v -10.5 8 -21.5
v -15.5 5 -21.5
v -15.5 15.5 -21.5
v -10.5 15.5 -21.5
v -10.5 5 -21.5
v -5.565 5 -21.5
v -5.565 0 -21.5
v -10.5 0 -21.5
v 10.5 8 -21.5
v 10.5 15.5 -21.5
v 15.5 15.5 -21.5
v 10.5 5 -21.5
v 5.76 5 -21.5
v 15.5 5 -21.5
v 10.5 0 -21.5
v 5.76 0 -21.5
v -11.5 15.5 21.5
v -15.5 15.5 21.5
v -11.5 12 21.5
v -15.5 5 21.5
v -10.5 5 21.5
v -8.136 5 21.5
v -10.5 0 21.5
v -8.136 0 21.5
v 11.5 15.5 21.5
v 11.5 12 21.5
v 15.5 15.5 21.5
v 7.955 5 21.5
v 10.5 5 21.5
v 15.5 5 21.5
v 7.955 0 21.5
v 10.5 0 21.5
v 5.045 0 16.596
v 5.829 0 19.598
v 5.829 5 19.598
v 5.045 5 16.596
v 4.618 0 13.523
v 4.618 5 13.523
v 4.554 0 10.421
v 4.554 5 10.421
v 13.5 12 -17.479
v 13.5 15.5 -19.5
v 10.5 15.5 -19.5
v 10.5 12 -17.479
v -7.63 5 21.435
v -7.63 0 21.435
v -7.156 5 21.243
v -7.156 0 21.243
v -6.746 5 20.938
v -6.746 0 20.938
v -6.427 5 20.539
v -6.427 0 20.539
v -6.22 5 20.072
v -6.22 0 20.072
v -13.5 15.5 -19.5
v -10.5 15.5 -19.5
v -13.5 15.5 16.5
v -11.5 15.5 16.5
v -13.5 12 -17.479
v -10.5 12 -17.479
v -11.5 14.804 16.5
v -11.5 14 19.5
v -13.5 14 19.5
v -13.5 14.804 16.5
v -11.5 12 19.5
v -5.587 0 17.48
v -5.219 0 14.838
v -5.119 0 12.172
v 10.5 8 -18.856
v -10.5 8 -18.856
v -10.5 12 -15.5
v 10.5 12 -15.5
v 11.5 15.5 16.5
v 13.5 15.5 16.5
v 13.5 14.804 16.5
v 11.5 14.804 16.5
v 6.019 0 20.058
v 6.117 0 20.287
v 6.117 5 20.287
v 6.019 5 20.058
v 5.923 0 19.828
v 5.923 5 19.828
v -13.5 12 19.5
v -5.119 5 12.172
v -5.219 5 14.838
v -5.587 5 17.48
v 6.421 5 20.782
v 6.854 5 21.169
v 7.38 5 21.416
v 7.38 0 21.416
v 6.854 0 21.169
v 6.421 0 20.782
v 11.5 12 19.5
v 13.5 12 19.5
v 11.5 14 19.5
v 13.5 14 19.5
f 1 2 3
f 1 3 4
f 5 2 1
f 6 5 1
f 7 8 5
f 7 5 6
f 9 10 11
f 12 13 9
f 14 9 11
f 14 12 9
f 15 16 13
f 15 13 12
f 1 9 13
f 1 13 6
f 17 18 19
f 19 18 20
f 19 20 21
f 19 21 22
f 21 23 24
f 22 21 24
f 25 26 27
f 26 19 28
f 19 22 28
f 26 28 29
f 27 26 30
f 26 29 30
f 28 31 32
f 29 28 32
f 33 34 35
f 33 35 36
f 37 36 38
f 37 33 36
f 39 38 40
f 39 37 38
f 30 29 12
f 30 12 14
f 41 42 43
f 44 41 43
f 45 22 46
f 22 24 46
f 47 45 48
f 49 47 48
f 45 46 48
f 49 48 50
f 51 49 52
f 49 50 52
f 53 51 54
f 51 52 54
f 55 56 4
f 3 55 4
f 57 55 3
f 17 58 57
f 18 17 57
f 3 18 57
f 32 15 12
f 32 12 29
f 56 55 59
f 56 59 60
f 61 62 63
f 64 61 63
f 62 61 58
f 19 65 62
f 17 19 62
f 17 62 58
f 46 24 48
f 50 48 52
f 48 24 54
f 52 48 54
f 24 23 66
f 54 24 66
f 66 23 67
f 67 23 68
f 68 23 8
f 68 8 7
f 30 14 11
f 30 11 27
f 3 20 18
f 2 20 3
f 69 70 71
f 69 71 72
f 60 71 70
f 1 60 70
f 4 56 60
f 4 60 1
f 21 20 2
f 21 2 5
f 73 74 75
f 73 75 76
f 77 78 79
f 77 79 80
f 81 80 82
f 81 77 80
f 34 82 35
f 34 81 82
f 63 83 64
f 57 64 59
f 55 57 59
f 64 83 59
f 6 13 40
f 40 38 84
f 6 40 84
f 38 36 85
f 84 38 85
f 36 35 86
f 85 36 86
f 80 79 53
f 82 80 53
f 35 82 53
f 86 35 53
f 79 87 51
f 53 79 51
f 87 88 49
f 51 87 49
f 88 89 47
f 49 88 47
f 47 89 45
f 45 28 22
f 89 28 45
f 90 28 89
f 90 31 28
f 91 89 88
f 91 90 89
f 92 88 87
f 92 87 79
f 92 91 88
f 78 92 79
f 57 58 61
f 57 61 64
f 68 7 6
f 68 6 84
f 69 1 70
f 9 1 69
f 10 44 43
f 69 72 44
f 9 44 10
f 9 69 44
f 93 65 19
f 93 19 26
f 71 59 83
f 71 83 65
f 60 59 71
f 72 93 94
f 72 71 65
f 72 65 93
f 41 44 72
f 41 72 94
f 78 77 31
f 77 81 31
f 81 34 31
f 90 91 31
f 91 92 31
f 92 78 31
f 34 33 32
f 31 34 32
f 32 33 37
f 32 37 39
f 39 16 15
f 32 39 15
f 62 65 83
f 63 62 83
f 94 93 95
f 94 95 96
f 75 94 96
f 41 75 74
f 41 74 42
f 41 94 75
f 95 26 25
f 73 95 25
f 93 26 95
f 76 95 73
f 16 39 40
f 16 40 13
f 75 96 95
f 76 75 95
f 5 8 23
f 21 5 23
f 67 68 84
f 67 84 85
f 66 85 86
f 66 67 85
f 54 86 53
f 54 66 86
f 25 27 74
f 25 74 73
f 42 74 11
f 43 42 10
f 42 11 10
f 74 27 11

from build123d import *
from OCP.BRepFilletAPI import BRepFilletAPI_MakeChamfer

# Parameters (mm, degrees)
SZKIC1_W                    = 31
SZKIC1_H                    = 43
DODANIE_WYCI_GNI_CIE1_DEPTH = 12
DODANIE_WYCI_GNI_CIE3_DEPTH = 5
SZKIC4_W                    = 5
SZKIC4_H                    = 43
WYTNIJ_WYCI_GNI_CIE1_DEPTH  = 5
DODANIE_WYCI_GNI_CIE4_DEPTH = 3.5
SZKIC6_W                    = 21
SZKIC6_H                    = 6
WYTNIJ_WYCI_GNI_CIE2_DEPTH  = 4
SFAZOWANIE1_SIZE2           = 3.356398525
SFAZOWANIE1_SIZE            = 4
SFAZOWANIE2_SIZE            = 2.020725942
SFAZOWANIE2_SIZE_2          = 3.5
ZAOKR_GLENIE2_R             = 2
SZKIC7_W                    = 2
SZKIC7_H                    = 1.5
DODANIE_WYCI_GNI_CIE5_DEPTH = 3
SFAZOWANIE3_SIZE            = 3
SFAZOWANIE3_SIZE_2          = 0.803847577


with BuildPart() as part:
    # Szkic1 → Dodanie-wyciągnięcie1 (new body)
    with BuildSketch(Plane(origin=(0, 0, 0), x_dir=(1, 0, 0), z_dir=(0, 1, 0))):
        Rectangle(SZKIC1_W, SZKIC1_H)
    extrude(amount=DODANIE_WYCI_GNI_CIE1_DEPTH)


with BuildPart() as body_2:
    # Szkic3 → Dodanie-wyciągnięcie3 (new body)
    with BuildSketch(Plane.XZ):
        with BuildLine():
            Line((-10.212337084, 28.112329696), (-14.125358878, 33.459474506))
            ThreePointArc((-14.125358878, 33.459474506), (-14.461615087, 35.767305941), (-12.741502742, 37.342224254))
            ThreePointArc((-12.741502742, 37.342224254), (-8.998415843, 41.011293853), (-10.279093338, 46.09387552))
            Line((-10.279093338, 46.09387552), (-15.166024728, 51.154438355))
            ThreePointArc((-15.166024728, 51.154438355), (-15.686793901, 52.037661779), (-15.750705614, 53.06098941))
            ThreePointArc((-15.750705614, 53.06098941), (-13.686472686, 56.384695233), (-10.429010158, 58.55195522))
            ThreePointArc((-10.429010158, 58.55195522), (-9.157993267, 58.652708308), (-8.044536022, 58.031541594))
            Line((-8.044536022, 58.031541594), (-4.224518095, 54.075788657))
            ThreePointArc((-4.224518095, 54.075788657), (0.407878305, 52.061536199), (5.107784388, 53.912803922))
            Line((5.107784388, 53.912803922), (9.063616274, 57.732769227))
            ThreePointArc((9.063616274, 57.732769227), (9.946850008, 58.253523329), (10.970179942, 58.317417838))
            ThreePointArc((10.970179942, 58.317417838), (12.642937927, 57.562348173), (14.103566869, 56.451126968))
            ThreePointArc((14.103566869, 56.451126968), (15.47806196, 54.856926305), (16.461051962, 52.995624834))
            ThreePointArc((16.461051962, 52.995624834), (16.56178137, 51.724613884), (15.94059861, 50.611174515))
            Line((15.94059861, 50.611174515), (10.879953282, 45.72434942))
            ThreePointArc((10.879953282, 45.72434942), (9.272518926, 41.94367997), (10.871160741, 38.159284239))
            ThreePointArc((10.871160741, 38.159284239), (11.521401414, 37.62253212), (12.248997344, 37.19648056))
            ThreePointArc((12.248997344, 37.19648056), (13.149955836, 36.868062858), (13.971590322, 36.373592268))
            ThreePointArc((13.971590322, 36.373592268), (14.805880692, 34.730389937), (14.282706099, 32.963346456))
            ThreePointArc((14.282706099, 32.963346456), (9.465690514, 26.653949977), (5.828617709, 19.59818464))
            ThreePointArc((5.828617709, 19.59818464), (4.786614899, 15.065901025), (4.553521224, 10.421223215))
            Line((4.553521224, 10.421223215), (7.14350853, -58.109023822))
            ThreePointArc((7.14350853, -58.109023822), (7.019012284, -59.657823394), (6.535877134, -61.134596855))
            Line((6.535877134, -61.134596855), (1.314918151, -72.39460248))
            ThreePointArc((1.314918151, -72.39460248), (-1.069105556, -73.746830857), (-3.119902204, -71.928500927))
            Line((-3.119902204, -71.928500927), (-5.8858069, -59.829088544))
            ThreePointArc((-5.8858069, -59.829088544), (-6.014905284, -59.054960819), (-6.051200692, -58.27098201))
            Line((-6.051200692, -58.27098201), (-5.119340887, 12.172423843))
            ThreePointArc((-5.119340887, 12.172423843), (-6.369476529, 20.556580537), (-10.212337084, 28.112329696))
        make_face()
    extrude(amount=-DODANIE_WYCI_GNI_CIE3_DEPTH)


with BuildPart() as part_1:
    add(part.part)

    # Połącz1: cut body 2
    add(body_2.part, mode=Mode.SUBTRACT)

    # Szkic4 → Wytnij-wyciągnięcie1 (cut)
    with BuildSketch(Plane.XZ):
        with Locations((13, 0)):
            Rectangle(SZKIC4_W, SZKIC4_H)
        with Locations((-13, 0)):
            Rectangle(SZKIC4_W, SZKIC4_H)
    extrude(amount=-WYTNIJ_WYCI_GNI_CIE1_DEPTH, mode=Mode.SUBTRACT)

    # Szkic5 → Dodanie-wyciągnięcie4 (add)
    with BuildSketch(Plane(origin=(0, 12, 0), x_dir=(1, 0, 0), z_dir=(0, 1, 0))):
        Polygon((10.5, 19.5), (10.5, 21.5), (15.5, 21.5), (15.5, -21.5), (11.5, -21.5), (11.5, -19.5), (13.5, -19.5), (13.5, 19.5), align=None)
        Polygon((-15.5, 21.5), (-15.5, -21.5), (-11.5, -21.5), (-11.5, -19.5), (-13.5, -19.5), (-13.5, 19.5), (-10.5, 19.5), (-10.5, 21.5), align=None)
    extrude(amount=DODANIE_WYCI_GNI_CIE4_DEPTH)

    # Szkic6 → Wytnij-wyciągnięcie2 (cut)
    with BuildSketch(Plane(origin=(0, 12, 0), x_dir=(1, 0, 0), z_dir=(0, 1, 0))):
        with Locations((0, 18.5)):
            Rectangle(SZKIC6_W, SZKIC6_H)
    extrude(amount=-WYTNIJ_WYCI_GNI_CIE2_DEPTH, mode=Mode.SUBTRACT)

    # Sfazowanie1
    sfazowanie1_edges = [part_1.edges().sort_by_distance(p)[0] for p in [
        (0, 8, -15.5),
    ]]
    sfazowanie1_side = [part_1.faces().sort_by_distance(p)[0] for p in [
        (0, 8.06712797, -15.5),
    ]]
    chamfer(sfazowanie1_edges, length=SFAZOWANIE1_SIZE - 0.0001, length2=SFAZOWANIE1_SIZE2 - 0.0001, reference=sfazowanie1_side[0])  # a hair under: the kernel refuses the full size

    # Sfazowanie2
    sfazowanie2_edges_1 = [part_1.edges().sort_by_distance(p)[0] for p in [
        (12, 12, -19.5),
    ]]
    sfazowanie2_side_1 = [part_1.faces().sort_by_distance(p)[0] for p in [
        (12, 12, -19.459585481),
    ]]
    sfazowanie2_edges_2 = [part_1.edges().sort_by_distance(p)[0] for p in [
        (-12, 12, -19.5),
    ]]
    sfazowanie2_side_2 = [part_1.faces().sort_by_distance(p)[0] for p in [
        (-12, 12, -19.459585481),
    ]]
    sfazowanie2 = BRepFilletAPI_MakeChamfer(part_1.part.solid().wrapped)
    for e in sfazowanie2_edges_1:
        sfazowanie2.Add(SFAZOWANIE2_SIZE - 0.0001, SFAZOWANIE2_SIZE_2 - 0.0001, e.wrapped, sfazowanie2_side_1[0].wrapped)
    for e in sfazowanie2_edges_2:
        sfazowanie2.Add(SFAZOWANIE2_SIZE - 0.0001, SFAZOWANIE2_SIZE_2 - 0.0001, e.wrapped, sfazowanie2_side_2[0].wrapped)
    add(Compound.cast(sfazowanie2.Shape()), mode=Mode.REPLACE)  # a hair under: the kernel refuses the full size

    # Zaokrąglenie2
    zaokr_glenie2_edges = [part_1.edges().sort_by_distance(p)[0] for p in [
        (-6.690658064, 2.5, 21.5),
        (6.65719404, 2.5, 21.5),
    ]]
    fillet(zaokr_glenie2_edges, radius=ZAOKR_GLENIE2_R)

    # Szkic7 → Dodanie-wyciągnięcie5 (add)
    with BuildSketch(Plane(origin=(0, 0, 19.5), x_dir=(-1, 0, 0), z_dir=(0, 0, -1))):
        with Locations((12.5, 14.75)):
            Rectangle(SZKIC7_W, SZKIC7_H)
        with Locations((-12.5, 14.75)):
            Rectangle(SZKIC7_W, SZKIC7_H)
    extrude(amount=DODANIE_WYCI_GNI_CIE5_DEPTH)

    # Sfazowanie3
    sfazowanie3_edges_1 = [part_1.edges().sort_by_distance(p)[0] for p in [
        (-12.5, 14, 16.5),
    ]]
    sfazowanie3_side_1 = [part_1.faces().sort_by_distance(p)[0] for p in [
        (-12.5, 14, 16.516076952),
    ]]
    sfazowanie3_edges_2 = [part_1.edges().sort_by_distance(p)[0] for p in [
        (12.5, 14, 16.5),
    ]]
    sfazowanie3_side_2 = [part_1.faces().sort_by_distance(p)[0] for p in [
        (12.5, 14, 16.516076952),
    ]]
    sfazowanie3 = BRepFilletAPI_MakeChamfer(part_1.part.solid().wrapped)
    for e in sfazowanie3_edges_1:
        sfazowanie3.Add(SFAZOWANIE3_SIZE - 0.0001, SFAZOWANIE3_SIZE_2 - 0.0001, e.wrapped, sfazowanie3_side_1[0].wrapped)
    for e in sfazowanie3_edges_2:
        sfazowanie3.Add(SFAZOWANIE3_SIZE - 0.0001, SFAZOWANIE3_SIZE_2 - 0.0001, e.wrapped, sfazowanie3_side_2[0].wrapped)
    add(Compound.cast(sfazowanie3.Shape()), mode=Mode.REPLACE)  # a hair under: the kernel refuses the full size


solid = part_1.part
